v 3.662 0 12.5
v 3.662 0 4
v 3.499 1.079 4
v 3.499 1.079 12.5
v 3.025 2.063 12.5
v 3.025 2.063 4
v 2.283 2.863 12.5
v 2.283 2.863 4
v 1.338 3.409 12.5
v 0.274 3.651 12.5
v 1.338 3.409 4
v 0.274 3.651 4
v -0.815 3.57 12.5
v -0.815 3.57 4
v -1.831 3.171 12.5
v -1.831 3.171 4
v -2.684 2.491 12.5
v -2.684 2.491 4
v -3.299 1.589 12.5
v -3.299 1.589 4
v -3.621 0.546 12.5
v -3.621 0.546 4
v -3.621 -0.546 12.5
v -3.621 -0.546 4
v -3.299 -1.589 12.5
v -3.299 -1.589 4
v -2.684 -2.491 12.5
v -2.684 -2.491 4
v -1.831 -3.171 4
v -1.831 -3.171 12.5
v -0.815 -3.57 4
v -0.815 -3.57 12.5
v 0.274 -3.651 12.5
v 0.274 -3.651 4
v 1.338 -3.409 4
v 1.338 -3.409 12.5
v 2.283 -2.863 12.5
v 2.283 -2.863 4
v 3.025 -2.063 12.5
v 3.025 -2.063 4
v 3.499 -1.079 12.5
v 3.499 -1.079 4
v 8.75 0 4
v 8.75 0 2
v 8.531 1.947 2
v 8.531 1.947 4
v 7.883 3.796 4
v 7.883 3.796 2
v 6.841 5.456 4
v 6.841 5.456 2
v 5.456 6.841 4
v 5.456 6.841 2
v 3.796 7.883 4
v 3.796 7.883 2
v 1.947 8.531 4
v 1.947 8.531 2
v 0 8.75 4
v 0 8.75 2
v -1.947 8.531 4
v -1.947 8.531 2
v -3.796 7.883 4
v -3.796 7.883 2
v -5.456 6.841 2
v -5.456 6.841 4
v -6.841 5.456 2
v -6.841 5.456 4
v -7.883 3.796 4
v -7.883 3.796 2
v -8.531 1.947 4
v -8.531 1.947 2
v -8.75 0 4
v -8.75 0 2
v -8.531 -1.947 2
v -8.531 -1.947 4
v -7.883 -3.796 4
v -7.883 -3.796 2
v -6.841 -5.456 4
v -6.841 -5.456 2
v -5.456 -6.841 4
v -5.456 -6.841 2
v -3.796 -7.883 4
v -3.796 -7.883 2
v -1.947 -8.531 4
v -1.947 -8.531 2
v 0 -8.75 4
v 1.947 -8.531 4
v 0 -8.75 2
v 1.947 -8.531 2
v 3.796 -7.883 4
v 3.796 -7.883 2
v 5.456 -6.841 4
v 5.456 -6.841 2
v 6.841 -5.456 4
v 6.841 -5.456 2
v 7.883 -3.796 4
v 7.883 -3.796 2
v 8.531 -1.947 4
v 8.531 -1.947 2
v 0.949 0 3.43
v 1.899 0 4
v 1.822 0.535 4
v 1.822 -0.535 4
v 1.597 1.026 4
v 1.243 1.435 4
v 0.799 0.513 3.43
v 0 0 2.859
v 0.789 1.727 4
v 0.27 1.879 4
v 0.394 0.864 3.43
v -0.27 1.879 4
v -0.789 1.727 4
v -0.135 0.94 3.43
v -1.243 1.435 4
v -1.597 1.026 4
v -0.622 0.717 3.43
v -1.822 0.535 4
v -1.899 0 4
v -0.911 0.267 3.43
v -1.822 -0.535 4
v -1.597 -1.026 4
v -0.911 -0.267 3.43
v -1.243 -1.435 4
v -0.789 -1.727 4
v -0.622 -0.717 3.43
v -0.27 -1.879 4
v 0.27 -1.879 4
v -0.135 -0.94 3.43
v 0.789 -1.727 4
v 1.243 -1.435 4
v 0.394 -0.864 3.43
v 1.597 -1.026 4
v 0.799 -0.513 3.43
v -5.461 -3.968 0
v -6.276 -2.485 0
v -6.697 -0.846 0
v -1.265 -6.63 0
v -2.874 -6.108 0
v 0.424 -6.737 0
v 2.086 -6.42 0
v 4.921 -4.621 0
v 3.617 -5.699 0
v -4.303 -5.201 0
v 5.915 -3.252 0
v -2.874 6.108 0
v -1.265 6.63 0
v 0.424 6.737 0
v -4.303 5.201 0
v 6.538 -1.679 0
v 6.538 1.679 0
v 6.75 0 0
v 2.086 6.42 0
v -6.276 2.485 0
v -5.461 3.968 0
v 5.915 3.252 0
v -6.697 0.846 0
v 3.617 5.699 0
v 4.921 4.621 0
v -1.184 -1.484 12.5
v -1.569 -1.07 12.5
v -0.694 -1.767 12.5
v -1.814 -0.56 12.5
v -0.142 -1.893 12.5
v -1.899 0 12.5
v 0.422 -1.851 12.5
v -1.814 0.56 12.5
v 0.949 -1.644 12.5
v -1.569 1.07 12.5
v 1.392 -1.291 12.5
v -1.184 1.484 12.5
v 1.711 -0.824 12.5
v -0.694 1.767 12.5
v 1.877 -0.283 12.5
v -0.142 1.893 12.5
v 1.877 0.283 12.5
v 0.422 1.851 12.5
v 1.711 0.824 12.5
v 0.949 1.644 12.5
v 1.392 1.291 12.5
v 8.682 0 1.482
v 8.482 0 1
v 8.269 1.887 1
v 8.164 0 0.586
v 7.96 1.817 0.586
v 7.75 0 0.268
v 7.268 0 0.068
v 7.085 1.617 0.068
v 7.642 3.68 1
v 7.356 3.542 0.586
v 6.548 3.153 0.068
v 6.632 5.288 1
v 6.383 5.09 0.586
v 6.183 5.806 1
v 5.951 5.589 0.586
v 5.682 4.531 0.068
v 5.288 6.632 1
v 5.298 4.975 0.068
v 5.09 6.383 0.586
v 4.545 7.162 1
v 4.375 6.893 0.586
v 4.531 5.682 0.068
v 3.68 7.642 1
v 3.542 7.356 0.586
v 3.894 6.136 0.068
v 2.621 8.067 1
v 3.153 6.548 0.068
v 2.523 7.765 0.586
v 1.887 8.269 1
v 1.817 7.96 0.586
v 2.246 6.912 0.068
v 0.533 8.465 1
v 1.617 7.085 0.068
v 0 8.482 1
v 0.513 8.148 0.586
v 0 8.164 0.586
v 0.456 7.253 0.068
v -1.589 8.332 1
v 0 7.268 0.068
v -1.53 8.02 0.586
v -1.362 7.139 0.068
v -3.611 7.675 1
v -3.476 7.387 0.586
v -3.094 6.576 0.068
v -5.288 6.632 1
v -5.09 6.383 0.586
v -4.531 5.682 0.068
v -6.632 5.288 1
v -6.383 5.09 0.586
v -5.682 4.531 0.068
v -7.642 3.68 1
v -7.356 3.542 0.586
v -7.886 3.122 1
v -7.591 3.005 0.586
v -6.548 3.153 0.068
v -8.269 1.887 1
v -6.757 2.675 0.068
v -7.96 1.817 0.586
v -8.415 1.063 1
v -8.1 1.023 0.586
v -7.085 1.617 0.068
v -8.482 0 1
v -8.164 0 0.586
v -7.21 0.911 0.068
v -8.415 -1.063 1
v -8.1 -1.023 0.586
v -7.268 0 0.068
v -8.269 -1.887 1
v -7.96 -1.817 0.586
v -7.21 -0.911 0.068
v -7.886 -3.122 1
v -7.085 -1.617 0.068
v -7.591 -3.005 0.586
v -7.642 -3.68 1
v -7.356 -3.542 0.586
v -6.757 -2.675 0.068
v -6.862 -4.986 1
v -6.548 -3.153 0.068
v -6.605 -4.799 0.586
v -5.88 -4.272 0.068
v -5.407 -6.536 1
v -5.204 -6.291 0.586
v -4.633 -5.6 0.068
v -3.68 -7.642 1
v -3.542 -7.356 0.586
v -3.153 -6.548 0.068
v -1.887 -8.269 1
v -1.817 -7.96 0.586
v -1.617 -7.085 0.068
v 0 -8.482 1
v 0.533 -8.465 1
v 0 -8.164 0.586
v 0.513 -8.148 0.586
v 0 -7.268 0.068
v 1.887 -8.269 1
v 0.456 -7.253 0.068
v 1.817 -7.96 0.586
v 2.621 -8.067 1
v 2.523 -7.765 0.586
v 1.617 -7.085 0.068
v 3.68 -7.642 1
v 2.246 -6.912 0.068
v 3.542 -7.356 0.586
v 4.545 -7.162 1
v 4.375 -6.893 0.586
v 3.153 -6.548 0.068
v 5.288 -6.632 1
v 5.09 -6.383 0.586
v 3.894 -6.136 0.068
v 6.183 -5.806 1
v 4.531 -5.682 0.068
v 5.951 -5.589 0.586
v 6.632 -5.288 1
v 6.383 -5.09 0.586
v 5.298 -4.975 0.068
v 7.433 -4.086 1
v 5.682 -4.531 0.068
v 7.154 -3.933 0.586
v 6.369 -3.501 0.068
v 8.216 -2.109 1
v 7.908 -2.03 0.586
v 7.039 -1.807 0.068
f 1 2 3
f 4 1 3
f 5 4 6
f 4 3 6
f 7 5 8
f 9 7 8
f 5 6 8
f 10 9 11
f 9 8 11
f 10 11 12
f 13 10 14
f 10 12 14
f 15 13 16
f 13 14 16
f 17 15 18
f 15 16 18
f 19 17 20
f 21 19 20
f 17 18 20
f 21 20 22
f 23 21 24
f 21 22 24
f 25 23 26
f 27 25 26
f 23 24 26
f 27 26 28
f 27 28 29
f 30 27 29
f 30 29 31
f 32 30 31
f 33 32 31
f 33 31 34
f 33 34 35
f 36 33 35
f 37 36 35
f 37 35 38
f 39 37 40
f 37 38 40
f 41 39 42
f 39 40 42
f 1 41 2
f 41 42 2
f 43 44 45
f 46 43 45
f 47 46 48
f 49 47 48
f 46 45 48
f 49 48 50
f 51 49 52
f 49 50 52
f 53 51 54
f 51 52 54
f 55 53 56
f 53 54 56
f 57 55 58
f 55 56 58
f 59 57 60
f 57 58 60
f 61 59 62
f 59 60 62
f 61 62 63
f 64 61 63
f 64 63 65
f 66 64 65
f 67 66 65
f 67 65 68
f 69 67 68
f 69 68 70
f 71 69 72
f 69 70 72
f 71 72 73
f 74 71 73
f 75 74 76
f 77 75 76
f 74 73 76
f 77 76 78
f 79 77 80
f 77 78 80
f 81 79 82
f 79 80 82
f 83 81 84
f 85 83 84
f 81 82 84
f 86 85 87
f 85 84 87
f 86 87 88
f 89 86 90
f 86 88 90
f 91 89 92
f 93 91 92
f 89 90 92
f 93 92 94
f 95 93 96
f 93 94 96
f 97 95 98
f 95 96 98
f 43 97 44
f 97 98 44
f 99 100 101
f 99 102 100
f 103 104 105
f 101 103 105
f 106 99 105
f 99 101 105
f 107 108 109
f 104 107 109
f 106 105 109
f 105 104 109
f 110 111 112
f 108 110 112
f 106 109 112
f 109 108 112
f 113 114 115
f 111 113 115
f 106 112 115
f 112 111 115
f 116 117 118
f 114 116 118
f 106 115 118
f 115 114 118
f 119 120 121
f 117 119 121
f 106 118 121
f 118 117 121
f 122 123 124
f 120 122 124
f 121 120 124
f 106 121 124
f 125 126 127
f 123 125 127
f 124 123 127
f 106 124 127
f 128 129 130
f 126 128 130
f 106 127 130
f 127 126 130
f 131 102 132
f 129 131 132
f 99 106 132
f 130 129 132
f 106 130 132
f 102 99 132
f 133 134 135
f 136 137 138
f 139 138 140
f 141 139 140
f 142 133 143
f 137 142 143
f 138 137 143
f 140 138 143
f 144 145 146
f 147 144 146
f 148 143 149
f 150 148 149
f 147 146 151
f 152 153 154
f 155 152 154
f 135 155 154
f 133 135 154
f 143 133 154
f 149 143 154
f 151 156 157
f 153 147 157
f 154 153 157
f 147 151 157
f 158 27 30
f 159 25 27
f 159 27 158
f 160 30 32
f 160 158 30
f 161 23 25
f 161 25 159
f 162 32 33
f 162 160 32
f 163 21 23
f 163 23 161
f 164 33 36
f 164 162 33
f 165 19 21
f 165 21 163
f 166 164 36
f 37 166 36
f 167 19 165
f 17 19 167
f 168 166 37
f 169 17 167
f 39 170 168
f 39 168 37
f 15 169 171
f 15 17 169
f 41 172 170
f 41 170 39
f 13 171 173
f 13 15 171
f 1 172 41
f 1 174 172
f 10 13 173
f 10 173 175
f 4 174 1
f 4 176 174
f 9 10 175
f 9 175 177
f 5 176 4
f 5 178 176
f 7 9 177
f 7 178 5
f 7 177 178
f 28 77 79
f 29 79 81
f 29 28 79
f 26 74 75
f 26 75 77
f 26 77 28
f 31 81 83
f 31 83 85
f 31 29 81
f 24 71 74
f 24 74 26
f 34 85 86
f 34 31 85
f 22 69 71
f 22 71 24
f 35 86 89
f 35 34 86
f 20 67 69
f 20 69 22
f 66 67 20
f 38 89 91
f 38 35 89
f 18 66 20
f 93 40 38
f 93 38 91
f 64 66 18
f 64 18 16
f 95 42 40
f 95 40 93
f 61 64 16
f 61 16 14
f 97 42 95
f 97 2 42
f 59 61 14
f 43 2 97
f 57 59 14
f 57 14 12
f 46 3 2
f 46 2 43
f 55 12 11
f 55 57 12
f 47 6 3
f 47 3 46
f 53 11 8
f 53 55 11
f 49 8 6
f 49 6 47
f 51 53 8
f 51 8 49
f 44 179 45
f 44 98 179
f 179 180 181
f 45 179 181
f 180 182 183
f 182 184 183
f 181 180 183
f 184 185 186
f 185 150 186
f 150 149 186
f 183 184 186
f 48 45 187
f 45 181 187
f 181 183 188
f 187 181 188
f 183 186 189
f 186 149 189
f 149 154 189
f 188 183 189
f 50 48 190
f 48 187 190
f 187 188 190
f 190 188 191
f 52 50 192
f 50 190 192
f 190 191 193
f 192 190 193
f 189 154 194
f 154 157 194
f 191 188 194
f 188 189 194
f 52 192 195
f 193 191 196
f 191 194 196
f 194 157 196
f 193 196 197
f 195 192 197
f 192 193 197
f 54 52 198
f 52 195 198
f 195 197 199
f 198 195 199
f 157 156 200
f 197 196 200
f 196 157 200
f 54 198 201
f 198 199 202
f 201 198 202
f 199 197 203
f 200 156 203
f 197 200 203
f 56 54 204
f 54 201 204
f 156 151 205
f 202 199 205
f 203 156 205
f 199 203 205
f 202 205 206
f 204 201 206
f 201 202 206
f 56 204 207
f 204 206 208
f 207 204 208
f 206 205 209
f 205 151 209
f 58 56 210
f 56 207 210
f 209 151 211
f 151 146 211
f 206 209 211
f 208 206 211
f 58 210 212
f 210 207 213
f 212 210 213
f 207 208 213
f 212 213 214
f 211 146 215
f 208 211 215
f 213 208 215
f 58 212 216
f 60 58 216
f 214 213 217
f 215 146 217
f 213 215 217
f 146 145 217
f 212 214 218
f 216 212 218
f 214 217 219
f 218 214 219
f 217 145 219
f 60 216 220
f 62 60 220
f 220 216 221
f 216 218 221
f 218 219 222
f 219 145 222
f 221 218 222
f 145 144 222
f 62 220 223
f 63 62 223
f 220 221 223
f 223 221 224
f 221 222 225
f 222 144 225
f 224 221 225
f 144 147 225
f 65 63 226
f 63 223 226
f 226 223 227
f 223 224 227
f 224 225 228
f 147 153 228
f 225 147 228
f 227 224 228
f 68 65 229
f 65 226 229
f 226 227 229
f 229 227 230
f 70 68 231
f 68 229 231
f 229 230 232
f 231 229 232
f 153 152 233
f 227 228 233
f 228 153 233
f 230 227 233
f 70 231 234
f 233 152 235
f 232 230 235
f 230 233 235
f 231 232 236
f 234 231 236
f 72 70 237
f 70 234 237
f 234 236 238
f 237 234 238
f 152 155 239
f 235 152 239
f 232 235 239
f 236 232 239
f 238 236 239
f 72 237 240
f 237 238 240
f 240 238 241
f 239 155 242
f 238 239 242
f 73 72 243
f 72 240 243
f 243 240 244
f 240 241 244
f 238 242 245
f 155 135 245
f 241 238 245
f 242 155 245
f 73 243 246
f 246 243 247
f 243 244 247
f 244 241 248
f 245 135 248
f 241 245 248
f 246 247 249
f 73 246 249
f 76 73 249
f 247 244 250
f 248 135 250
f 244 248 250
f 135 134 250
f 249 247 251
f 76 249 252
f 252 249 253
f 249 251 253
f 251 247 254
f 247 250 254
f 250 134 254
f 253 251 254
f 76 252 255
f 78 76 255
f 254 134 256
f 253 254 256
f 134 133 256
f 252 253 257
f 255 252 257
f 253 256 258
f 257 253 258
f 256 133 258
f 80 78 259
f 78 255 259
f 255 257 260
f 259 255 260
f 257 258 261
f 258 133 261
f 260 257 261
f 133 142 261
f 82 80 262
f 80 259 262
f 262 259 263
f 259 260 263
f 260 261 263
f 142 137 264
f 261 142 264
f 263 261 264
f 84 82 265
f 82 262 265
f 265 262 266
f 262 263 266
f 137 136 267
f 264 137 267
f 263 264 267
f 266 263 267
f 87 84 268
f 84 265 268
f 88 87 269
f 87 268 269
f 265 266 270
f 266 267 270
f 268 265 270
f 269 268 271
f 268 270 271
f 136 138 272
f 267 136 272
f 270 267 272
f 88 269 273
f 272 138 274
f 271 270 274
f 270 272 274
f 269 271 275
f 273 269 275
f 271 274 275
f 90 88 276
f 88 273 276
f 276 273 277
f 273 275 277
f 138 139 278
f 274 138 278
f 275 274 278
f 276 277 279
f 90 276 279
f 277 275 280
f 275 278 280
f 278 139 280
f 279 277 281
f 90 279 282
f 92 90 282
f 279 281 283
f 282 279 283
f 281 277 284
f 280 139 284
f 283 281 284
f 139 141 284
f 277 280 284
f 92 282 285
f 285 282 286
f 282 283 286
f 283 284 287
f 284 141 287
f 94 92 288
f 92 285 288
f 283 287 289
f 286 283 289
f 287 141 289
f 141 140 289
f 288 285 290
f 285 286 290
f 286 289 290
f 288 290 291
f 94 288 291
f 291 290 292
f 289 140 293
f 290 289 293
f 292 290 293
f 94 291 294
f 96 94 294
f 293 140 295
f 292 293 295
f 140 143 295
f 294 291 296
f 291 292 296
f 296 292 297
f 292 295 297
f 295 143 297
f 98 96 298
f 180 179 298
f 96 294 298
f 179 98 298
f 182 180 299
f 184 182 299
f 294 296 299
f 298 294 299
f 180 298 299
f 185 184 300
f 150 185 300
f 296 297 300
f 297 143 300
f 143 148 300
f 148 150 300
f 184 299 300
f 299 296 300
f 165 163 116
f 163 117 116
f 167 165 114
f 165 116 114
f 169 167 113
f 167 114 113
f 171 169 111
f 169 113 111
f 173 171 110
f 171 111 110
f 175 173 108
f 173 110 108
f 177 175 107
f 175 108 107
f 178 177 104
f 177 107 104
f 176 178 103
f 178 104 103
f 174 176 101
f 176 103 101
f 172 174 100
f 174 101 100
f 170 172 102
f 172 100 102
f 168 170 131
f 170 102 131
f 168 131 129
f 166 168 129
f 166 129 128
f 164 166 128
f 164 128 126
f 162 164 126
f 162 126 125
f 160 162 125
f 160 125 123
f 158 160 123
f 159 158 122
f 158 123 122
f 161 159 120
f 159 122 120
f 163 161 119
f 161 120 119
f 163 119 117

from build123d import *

# Parameters (mm, degrees)
F0_R     = 8.75
F1_DEPTH = 4
F2_R     = 3.6616494724
F3_DEPTH = 8.5
F5_D     = 3.7973
F5_DEPTH = 8.5
F5_TIP   = 1.1408240143
F6_R     = 2


with BuildPart() as f1:
    # F0 (on Top) → F1 (new body)
    with BuildSketch(Plane.XY):
        Circle(F0_R)
    extrude(amount=F1_DEPTH)

    # F2 (on face) → F3 (join)
    with BuildSketch(Plane.XY.offset(4)):
        Circle(F2_R)
    extrude(amount=F3_DEPTH)

    # F5
    with Locations(Plane.XY.offset(12.5)):
        with Locations((0, 0)):
            Hole(F5_D / 2, depth=F5_DEPTH)
            with Locations((0, 0, -(F5_DEPTH + F5_TIP / 2))):  # 118° drill point
                Cone(0, F5_D / 2, F5_TIP, mode=Mode.SUBTRACT)

    # F6
    f6_edges = [f1.edges().sort_by_distance(p)[0] for p in [
        (-8.75, 0, 0),
    ]]
    fillet(f6_edges, radius=F6_R)


solid = f1.part
